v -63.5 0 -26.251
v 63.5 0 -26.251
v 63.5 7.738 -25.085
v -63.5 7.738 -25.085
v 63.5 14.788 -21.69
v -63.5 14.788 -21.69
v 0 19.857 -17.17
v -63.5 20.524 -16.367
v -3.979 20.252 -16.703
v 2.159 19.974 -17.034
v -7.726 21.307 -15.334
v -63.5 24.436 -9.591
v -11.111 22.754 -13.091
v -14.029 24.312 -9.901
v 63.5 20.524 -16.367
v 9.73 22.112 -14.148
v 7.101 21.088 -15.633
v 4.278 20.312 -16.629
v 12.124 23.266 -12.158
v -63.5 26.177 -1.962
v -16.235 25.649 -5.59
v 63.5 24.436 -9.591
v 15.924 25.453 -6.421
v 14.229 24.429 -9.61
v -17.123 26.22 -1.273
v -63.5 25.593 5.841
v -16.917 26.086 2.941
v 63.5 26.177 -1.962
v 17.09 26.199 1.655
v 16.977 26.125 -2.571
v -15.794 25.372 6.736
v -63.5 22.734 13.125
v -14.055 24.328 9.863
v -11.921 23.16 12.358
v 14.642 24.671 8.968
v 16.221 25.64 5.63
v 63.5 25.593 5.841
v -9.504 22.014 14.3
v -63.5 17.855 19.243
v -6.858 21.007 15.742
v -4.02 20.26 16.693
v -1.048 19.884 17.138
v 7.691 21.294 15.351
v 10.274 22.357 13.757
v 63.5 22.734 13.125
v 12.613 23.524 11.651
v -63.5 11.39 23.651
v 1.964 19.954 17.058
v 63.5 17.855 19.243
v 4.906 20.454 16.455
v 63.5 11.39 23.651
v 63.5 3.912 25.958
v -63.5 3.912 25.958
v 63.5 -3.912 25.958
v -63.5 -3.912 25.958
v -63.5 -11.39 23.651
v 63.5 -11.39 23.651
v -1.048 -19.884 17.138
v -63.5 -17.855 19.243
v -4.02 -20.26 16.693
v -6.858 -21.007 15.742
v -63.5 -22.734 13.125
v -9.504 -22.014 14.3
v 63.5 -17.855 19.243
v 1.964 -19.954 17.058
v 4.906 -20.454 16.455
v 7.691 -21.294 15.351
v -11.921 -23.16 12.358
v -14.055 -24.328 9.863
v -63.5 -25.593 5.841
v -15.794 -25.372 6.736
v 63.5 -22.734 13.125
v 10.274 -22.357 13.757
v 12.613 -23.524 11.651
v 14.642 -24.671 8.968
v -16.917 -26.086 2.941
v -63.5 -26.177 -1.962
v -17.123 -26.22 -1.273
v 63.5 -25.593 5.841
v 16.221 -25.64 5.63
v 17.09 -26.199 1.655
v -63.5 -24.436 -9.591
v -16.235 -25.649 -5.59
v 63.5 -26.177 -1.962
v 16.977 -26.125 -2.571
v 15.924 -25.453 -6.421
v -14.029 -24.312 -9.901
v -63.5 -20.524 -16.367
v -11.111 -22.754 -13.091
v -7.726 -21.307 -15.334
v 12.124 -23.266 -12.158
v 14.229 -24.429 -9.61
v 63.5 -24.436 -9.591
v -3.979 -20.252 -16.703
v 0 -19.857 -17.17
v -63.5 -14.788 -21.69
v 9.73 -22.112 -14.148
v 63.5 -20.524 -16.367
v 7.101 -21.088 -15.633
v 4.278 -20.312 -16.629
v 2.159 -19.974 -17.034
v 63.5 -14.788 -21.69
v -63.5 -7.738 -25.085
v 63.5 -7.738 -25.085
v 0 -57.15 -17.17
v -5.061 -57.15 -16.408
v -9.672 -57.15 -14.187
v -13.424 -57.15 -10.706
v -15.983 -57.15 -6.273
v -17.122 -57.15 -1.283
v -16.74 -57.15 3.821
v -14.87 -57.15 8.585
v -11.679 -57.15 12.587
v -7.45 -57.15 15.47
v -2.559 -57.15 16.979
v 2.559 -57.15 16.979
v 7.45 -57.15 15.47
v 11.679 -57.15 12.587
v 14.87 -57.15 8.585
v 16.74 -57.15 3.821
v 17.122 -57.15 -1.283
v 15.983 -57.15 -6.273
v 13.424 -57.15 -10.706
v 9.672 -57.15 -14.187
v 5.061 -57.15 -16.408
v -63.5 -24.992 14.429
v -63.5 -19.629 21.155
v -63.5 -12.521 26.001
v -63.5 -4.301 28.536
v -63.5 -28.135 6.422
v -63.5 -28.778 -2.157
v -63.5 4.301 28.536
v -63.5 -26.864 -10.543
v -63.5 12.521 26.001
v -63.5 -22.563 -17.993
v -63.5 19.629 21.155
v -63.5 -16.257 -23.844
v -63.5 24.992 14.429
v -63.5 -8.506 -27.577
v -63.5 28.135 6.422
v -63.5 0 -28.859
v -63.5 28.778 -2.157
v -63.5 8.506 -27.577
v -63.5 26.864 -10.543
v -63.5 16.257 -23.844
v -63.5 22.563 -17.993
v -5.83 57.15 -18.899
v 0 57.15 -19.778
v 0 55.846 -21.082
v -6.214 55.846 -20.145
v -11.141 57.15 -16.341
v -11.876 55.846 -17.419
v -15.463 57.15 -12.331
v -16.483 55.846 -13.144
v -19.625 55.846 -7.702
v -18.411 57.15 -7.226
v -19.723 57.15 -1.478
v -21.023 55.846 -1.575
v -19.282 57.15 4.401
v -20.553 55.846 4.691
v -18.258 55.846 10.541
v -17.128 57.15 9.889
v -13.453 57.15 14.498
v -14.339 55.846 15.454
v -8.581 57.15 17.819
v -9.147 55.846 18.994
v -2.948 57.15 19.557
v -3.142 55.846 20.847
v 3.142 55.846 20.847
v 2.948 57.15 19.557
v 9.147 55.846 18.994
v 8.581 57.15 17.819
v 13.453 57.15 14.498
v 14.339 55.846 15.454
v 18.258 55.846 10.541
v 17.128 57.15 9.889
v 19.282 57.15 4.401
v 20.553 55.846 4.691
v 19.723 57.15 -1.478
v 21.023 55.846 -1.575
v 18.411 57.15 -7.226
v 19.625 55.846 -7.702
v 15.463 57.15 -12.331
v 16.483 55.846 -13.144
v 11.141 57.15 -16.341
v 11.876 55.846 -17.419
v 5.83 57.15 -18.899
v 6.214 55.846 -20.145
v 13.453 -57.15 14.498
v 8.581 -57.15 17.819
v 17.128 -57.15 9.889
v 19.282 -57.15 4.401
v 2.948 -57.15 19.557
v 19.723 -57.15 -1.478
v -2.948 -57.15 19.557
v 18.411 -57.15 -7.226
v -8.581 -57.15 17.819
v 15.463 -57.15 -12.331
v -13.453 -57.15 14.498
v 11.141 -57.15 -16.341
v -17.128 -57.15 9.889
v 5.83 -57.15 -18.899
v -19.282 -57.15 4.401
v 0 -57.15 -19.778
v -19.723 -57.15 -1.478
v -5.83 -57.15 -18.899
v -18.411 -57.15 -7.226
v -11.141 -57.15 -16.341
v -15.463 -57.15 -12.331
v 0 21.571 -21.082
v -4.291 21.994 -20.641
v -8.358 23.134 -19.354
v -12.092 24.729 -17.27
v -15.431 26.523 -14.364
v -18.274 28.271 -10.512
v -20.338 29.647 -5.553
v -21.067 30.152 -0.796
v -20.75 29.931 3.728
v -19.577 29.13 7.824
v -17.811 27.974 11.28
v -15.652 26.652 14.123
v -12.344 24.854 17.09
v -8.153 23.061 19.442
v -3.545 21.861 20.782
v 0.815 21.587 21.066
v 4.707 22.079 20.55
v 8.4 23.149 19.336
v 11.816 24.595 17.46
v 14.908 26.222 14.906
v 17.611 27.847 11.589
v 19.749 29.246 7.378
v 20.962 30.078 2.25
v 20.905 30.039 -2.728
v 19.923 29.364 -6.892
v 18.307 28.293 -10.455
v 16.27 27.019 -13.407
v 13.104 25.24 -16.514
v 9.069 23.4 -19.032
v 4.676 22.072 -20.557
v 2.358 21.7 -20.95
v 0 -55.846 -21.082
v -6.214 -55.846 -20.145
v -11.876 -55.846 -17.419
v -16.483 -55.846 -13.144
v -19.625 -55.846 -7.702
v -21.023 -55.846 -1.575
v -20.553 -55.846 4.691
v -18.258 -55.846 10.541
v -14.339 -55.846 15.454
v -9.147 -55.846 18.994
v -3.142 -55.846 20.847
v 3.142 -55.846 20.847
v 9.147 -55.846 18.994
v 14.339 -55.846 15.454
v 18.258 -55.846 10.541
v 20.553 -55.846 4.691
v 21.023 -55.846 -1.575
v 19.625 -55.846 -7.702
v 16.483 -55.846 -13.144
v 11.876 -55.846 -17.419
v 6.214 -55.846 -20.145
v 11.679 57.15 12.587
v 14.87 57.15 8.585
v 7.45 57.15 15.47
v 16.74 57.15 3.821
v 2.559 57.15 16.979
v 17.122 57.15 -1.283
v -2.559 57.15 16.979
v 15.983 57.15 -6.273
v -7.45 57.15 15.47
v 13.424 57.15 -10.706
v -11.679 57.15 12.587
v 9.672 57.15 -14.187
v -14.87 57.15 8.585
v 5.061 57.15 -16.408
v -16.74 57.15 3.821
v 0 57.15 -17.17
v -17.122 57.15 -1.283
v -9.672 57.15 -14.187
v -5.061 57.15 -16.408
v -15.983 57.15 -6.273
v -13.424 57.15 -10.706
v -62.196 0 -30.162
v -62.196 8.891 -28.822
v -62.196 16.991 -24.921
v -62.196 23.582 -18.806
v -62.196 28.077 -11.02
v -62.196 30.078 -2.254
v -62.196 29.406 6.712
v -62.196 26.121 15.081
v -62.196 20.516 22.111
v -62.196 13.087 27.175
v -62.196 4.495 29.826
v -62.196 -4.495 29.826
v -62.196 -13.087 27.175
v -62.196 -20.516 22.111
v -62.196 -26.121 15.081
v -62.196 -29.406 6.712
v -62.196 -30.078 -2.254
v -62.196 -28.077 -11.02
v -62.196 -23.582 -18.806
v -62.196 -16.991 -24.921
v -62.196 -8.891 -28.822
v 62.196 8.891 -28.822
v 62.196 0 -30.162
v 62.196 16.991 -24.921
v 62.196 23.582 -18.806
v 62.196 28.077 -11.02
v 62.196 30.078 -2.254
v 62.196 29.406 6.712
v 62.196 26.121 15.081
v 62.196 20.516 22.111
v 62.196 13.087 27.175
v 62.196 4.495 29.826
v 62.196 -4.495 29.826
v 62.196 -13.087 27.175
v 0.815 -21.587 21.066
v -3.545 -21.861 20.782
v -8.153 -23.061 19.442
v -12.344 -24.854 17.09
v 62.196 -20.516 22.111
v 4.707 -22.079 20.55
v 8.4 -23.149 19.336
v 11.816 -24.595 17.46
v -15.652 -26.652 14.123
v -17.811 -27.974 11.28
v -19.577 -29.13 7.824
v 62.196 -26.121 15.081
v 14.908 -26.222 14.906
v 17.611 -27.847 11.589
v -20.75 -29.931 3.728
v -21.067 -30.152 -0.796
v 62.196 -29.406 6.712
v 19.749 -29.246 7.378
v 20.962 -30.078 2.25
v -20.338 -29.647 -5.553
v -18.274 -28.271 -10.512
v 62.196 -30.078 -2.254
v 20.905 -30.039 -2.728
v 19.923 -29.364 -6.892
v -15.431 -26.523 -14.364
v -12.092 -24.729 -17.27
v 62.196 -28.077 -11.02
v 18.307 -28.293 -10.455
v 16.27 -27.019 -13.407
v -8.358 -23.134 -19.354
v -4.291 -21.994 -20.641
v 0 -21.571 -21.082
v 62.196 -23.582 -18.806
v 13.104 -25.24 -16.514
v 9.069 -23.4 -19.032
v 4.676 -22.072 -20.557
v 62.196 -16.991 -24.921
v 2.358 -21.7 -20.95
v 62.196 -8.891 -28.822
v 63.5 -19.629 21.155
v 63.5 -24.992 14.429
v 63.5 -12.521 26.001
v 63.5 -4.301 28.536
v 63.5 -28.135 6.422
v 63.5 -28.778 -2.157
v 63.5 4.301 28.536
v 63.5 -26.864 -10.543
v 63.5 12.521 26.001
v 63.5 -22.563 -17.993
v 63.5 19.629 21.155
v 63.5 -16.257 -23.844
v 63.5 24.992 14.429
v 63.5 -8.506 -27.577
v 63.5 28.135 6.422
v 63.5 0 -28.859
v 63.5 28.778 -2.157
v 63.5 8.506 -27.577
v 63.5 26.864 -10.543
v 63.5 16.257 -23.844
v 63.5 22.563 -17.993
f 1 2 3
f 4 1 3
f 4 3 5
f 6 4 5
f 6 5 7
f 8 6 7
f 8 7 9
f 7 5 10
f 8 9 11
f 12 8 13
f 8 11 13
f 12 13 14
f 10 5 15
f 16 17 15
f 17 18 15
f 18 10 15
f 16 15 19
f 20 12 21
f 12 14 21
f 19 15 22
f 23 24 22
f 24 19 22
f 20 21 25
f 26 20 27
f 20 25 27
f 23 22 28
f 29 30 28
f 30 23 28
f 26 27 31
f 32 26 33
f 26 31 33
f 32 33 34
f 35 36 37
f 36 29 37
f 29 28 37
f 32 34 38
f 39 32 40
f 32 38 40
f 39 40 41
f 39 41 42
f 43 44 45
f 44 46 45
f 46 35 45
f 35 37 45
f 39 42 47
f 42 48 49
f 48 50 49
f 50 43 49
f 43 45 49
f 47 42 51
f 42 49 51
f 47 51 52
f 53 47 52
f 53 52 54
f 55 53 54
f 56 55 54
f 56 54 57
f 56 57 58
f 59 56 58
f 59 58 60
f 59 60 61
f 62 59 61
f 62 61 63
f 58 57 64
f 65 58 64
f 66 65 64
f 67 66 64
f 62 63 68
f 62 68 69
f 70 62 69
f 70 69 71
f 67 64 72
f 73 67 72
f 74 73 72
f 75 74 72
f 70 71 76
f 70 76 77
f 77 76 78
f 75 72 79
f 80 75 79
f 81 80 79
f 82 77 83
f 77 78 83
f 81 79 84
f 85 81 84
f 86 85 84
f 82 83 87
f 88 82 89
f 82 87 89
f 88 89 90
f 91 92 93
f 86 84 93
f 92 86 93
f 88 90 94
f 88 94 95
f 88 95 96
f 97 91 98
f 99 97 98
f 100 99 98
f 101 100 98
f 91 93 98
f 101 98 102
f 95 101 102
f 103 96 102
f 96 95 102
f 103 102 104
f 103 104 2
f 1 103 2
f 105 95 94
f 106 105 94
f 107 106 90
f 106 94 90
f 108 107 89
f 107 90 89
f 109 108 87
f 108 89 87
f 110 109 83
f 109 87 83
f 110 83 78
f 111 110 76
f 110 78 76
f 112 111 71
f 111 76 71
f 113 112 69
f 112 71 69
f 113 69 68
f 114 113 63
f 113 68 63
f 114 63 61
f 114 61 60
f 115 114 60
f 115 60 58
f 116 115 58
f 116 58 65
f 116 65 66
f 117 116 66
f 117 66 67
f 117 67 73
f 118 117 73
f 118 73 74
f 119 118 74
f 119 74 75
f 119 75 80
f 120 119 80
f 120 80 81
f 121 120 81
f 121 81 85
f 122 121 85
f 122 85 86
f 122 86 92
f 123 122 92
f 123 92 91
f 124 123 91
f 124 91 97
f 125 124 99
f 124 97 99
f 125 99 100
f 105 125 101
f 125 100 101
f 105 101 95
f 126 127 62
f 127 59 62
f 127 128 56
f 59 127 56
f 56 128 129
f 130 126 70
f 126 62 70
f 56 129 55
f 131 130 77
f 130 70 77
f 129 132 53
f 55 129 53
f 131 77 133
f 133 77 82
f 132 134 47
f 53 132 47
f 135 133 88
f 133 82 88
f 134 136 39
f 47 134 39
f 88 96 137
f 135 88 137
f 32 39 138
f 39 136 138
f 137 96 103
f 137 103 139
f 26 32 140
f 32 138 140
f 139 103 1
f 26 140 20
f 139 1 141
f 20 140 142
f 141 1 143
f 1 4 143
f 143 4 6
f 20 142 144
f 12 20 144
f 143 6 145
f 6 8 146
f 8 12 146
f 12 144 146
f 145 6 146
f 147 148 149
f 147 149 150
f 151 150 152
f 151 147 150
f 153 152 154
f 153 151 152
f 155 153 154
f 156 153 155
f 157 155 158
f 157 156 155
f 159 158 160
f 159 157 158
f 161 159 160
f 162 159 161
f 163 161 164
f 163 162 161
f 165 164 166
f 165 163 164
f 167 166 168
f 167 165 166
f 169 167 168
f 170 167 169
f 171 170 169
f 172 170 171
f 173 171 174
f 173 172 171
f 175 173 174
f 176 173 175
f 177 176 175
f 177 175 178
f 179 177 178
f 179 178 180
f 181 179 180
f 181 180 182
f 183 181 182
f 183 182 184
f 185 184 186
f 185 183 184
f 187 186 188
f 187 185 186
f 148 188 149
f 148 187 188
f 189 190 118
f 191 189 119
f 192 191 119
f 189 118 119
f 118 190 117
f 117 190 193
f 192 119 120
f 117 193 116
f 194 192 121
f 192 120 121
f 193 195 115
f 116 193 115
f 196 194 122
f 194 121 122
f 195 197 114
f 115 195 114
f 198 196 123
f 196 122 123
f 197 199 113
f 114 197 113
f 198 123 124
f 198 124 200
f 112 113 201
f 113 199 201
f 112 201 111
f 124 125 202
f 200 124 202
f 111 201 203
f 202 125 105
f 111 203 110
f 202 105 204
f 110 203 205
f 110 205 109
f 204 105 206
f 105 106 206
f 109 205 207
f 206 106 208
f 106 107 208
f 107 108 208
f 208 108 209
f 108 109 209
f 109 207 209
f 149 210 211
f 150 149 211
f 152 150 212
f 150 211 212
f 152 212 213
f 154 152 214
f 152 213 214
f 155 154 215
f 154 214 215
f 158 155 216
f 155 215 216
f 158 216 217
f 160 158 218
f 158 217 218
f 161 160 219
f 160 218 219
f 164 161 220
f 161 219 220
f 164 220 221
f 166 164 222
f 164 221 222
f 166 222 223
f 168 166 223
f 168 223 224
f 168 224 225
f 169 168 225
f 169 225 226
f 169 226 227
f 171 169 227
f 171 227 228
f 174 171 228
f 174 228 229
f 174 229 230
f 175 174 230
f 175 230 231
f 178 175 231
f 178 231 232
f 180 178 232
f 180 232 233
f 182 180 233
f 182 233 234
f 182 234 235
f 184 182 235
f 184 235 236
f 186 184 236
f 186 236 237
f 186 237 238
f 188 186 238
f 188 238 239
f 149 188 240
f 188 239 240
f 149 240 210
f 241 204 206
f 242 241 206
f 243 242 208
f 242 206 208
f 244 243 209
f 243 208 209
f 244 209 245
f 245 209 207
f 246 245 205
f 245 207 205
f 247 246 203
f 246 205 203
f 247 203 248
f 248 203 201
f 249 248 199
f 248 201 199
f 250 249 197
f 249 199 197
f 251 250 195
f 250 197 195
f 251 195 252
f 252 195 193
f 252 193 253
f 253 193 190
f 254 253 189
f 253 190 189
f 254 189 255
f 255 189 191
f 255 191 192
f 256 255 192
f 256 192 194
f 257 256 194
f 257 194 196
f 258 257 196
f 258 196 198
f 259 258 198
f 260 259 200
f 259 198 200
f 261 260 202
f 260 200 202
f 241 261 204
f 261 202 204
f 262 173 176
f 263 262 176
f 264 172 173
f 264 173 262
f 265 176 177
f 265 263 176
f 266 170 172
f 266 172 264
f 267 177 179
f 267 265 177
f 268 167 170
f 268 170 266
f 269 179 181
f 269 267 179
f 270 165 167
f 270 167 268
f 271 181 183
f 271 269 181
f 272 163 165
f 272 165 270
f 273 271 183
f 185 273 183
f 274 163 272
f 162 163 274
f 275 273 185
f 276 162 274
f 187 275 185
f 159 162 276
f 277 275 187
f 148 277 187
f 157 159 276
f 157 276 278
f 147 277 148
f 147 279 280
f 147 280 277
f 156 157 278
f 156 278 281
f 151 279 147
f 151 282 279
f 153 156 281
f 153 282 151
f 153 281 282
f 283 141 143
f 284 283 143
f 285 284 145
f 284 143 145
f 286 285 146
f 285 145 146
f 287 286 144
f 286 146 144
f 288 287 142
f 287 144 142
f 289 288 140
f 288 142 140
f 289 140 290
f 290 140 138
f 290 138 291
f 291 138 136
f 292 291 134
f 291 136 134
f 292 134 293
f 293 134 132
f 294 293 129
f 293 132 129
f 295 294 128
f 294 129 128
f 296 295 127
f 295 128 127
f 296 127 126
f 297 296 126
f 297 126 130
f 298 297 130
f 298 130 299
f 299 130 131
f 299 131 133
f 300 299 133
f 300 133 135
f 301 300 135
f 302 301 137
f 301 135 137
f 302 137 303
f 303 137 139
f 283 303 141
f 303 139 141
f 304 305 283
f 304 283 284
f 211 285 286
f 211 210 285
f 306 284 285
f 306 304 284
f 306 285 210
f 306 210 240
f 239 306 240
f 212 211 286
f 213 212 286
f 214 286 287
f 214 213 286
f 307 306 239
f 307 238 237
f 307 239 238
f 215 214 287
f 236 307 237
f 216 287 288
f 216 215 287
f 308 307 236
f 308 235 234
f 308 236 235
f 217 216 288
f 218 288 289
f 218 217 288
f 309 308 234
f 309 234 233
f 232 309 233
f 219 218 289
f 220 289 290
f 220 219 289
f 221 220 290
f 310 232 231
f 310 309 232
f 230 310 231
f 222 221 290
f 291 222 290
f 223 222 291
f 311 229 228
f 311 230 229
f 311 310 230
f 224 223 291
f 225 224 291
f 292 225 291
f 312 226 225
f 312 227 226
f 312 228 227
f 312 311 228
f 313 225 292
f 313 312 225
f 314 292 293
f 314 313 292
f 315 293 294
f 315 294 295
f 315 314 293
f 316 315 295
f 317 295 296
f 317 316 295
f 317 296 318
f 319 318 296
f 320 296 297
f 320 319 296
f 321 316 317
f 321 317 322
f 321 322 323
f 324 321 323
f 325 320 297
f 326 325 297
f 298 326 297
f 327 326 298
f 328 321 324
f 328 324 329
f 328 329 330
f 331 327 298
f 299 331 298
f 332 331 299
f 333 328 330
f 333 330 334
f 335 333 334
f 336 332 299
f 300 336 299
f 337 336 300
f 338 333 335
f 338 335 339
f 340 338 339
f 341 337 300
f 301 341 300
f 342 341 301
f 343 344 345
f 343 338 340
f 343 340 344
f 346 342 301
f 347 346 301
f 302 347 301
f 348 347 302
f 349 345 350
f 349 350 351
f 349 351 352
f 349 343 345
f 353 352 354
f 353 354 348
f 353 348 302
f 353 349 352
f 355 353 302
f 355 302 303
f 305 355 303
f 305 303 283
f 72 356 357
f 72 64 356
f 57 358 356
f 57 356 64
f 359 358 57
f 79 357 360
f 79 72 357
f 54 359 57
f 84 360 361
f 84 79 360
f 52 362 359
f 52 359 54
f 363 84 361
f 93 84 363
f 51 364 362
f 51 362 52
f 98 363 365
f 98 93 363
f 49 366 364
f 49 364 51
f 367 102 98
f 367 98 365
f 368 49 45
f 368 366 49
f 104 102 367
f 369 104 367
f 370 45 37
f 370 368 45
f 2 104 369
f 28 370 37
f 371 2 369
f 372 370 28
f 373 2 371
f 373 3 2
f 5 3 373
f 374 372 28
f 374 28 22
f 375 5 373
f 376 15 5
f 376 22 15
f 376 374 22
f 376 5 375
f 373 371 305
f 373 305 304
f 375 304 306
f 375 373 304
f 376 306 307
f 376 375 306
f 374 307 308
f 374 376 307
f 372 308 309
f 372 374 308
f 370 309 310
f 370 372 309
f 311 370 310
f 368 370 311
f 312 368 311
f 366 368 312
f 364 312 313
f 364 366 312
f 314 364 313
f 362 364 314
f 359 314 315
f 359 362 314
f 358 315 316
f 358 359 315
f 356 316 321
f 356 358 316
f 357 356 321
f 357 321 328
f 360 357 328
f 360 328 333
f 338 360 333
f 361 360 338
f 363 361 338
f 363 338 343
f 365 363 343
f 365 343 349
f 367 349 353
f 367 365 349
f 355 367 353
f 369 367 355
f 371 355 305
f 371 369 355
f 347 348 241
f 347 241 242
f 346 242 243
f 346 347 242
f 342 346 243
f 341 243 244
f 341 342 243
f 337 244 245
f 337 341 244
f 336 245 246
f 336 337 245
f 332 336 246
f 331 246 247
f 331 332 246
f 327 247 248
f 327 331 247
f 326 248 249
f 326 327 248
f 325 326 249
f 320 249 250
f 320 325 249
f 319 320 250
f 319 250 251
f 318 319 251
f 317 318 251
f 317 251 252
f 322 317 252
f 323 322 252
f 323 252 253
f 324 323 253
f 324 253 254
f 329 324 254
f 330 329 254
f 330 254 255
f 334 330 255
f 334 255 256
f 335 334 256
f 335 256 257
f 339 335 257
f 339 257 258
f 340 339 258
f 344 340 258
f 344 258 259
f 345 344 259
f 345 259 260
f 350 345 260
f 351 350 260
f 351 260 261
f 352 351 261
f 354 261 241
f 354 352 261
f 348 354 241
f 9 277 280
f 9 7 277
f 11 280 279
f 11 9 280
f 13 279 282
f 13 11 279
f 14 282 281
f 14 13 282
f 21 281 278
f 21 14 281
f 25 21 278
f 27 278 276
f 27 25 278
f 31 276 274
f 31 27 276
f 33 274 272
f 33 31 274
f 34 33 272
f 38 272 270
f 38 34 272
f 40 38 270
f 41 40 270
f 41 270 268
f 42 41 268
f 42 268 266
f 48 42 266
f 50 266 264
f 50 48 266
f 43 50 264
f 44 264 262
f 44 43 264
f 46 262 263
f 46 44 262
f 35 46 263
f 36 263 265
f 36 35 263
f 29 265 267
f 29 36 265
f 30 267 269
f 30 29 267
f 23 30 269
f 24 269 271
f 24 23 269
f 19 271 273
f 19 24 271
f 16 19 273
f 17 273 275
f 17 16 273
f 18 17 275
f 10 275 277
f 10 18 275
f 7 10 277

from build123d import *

# Parameters (mm, degrees)
RUNROUTE_R          = 30.1625
RUNEXTRUDE_DEPTH    = 63.5
OUTLETROUTE_R       = 21.082
OUTLETEXTRUDE_DEPTH = 57.15
CROSSSHELL_T        = -3.9116
CROSSCHAMFER_SIZE   = 1.303866667


with BuildPart() as part:
    # RunRoute → RunExtrude (new body)
    with BuildSketch(Plane(origin=(0, 0, 0), x_dir=(0, 0, -1), z_dir=(1, 0, 0))):
        Circle(RUNROUTE_R)
    runextrude = extrude(amount=RUNEXTRUDE_DEPTH)

    # RunExtrudeMirror: RunExtrude across plane
    add(runextrude.mirror(Plane(origin=(0, 0, 0), x_dir=(0, 0, 1), z_dir=(1, 0, 0))))

    # OutletRoute → OutletExtrude (add)
    with BuildSketch(Plane(origin=(0, 0, 0), x_dir=(1, 0, 0), z_dir=(0, 1, 0))):
        with Locations(Location((0, 0, 0), (0, 0, 90))):
            Circle(OUTLETROUTE_R)
    outletextrude = extrude(amount=OUTLETEXTRUDE_DEPTH)

    # OutletExtrudeMirror: OutletExtrude across plane
    add(outletextrude.mirror(Plane.ZX))

    # CrossShell
    crossshell_openings = [part.faces().sort_by_distance(p)[0] for p in [
        (63.5, 0, 0),
        (0, 57.15, 0),
        (0, -57.15, 0),
        (-63.5, 0, 0),
    ]]
    offset(amount=CROSSSHELL_T, openings=crossshell_openings, kind=Kind.INTERSECTION)

    # CrossChamfer
    crosschamfer_edges = [part.edges().sort_by_distance(p)[0] for p in [
        (0, -57.15, 21.082),
        (63.5, 0, 30.1625),
        (-63.5, 0, 30.1625),
        (0, 57.15, 21.082),
    ]]
    chamfer(crosschamfer_edges, length=CROSSCHAMFER_SIZE)


solid = part.part
